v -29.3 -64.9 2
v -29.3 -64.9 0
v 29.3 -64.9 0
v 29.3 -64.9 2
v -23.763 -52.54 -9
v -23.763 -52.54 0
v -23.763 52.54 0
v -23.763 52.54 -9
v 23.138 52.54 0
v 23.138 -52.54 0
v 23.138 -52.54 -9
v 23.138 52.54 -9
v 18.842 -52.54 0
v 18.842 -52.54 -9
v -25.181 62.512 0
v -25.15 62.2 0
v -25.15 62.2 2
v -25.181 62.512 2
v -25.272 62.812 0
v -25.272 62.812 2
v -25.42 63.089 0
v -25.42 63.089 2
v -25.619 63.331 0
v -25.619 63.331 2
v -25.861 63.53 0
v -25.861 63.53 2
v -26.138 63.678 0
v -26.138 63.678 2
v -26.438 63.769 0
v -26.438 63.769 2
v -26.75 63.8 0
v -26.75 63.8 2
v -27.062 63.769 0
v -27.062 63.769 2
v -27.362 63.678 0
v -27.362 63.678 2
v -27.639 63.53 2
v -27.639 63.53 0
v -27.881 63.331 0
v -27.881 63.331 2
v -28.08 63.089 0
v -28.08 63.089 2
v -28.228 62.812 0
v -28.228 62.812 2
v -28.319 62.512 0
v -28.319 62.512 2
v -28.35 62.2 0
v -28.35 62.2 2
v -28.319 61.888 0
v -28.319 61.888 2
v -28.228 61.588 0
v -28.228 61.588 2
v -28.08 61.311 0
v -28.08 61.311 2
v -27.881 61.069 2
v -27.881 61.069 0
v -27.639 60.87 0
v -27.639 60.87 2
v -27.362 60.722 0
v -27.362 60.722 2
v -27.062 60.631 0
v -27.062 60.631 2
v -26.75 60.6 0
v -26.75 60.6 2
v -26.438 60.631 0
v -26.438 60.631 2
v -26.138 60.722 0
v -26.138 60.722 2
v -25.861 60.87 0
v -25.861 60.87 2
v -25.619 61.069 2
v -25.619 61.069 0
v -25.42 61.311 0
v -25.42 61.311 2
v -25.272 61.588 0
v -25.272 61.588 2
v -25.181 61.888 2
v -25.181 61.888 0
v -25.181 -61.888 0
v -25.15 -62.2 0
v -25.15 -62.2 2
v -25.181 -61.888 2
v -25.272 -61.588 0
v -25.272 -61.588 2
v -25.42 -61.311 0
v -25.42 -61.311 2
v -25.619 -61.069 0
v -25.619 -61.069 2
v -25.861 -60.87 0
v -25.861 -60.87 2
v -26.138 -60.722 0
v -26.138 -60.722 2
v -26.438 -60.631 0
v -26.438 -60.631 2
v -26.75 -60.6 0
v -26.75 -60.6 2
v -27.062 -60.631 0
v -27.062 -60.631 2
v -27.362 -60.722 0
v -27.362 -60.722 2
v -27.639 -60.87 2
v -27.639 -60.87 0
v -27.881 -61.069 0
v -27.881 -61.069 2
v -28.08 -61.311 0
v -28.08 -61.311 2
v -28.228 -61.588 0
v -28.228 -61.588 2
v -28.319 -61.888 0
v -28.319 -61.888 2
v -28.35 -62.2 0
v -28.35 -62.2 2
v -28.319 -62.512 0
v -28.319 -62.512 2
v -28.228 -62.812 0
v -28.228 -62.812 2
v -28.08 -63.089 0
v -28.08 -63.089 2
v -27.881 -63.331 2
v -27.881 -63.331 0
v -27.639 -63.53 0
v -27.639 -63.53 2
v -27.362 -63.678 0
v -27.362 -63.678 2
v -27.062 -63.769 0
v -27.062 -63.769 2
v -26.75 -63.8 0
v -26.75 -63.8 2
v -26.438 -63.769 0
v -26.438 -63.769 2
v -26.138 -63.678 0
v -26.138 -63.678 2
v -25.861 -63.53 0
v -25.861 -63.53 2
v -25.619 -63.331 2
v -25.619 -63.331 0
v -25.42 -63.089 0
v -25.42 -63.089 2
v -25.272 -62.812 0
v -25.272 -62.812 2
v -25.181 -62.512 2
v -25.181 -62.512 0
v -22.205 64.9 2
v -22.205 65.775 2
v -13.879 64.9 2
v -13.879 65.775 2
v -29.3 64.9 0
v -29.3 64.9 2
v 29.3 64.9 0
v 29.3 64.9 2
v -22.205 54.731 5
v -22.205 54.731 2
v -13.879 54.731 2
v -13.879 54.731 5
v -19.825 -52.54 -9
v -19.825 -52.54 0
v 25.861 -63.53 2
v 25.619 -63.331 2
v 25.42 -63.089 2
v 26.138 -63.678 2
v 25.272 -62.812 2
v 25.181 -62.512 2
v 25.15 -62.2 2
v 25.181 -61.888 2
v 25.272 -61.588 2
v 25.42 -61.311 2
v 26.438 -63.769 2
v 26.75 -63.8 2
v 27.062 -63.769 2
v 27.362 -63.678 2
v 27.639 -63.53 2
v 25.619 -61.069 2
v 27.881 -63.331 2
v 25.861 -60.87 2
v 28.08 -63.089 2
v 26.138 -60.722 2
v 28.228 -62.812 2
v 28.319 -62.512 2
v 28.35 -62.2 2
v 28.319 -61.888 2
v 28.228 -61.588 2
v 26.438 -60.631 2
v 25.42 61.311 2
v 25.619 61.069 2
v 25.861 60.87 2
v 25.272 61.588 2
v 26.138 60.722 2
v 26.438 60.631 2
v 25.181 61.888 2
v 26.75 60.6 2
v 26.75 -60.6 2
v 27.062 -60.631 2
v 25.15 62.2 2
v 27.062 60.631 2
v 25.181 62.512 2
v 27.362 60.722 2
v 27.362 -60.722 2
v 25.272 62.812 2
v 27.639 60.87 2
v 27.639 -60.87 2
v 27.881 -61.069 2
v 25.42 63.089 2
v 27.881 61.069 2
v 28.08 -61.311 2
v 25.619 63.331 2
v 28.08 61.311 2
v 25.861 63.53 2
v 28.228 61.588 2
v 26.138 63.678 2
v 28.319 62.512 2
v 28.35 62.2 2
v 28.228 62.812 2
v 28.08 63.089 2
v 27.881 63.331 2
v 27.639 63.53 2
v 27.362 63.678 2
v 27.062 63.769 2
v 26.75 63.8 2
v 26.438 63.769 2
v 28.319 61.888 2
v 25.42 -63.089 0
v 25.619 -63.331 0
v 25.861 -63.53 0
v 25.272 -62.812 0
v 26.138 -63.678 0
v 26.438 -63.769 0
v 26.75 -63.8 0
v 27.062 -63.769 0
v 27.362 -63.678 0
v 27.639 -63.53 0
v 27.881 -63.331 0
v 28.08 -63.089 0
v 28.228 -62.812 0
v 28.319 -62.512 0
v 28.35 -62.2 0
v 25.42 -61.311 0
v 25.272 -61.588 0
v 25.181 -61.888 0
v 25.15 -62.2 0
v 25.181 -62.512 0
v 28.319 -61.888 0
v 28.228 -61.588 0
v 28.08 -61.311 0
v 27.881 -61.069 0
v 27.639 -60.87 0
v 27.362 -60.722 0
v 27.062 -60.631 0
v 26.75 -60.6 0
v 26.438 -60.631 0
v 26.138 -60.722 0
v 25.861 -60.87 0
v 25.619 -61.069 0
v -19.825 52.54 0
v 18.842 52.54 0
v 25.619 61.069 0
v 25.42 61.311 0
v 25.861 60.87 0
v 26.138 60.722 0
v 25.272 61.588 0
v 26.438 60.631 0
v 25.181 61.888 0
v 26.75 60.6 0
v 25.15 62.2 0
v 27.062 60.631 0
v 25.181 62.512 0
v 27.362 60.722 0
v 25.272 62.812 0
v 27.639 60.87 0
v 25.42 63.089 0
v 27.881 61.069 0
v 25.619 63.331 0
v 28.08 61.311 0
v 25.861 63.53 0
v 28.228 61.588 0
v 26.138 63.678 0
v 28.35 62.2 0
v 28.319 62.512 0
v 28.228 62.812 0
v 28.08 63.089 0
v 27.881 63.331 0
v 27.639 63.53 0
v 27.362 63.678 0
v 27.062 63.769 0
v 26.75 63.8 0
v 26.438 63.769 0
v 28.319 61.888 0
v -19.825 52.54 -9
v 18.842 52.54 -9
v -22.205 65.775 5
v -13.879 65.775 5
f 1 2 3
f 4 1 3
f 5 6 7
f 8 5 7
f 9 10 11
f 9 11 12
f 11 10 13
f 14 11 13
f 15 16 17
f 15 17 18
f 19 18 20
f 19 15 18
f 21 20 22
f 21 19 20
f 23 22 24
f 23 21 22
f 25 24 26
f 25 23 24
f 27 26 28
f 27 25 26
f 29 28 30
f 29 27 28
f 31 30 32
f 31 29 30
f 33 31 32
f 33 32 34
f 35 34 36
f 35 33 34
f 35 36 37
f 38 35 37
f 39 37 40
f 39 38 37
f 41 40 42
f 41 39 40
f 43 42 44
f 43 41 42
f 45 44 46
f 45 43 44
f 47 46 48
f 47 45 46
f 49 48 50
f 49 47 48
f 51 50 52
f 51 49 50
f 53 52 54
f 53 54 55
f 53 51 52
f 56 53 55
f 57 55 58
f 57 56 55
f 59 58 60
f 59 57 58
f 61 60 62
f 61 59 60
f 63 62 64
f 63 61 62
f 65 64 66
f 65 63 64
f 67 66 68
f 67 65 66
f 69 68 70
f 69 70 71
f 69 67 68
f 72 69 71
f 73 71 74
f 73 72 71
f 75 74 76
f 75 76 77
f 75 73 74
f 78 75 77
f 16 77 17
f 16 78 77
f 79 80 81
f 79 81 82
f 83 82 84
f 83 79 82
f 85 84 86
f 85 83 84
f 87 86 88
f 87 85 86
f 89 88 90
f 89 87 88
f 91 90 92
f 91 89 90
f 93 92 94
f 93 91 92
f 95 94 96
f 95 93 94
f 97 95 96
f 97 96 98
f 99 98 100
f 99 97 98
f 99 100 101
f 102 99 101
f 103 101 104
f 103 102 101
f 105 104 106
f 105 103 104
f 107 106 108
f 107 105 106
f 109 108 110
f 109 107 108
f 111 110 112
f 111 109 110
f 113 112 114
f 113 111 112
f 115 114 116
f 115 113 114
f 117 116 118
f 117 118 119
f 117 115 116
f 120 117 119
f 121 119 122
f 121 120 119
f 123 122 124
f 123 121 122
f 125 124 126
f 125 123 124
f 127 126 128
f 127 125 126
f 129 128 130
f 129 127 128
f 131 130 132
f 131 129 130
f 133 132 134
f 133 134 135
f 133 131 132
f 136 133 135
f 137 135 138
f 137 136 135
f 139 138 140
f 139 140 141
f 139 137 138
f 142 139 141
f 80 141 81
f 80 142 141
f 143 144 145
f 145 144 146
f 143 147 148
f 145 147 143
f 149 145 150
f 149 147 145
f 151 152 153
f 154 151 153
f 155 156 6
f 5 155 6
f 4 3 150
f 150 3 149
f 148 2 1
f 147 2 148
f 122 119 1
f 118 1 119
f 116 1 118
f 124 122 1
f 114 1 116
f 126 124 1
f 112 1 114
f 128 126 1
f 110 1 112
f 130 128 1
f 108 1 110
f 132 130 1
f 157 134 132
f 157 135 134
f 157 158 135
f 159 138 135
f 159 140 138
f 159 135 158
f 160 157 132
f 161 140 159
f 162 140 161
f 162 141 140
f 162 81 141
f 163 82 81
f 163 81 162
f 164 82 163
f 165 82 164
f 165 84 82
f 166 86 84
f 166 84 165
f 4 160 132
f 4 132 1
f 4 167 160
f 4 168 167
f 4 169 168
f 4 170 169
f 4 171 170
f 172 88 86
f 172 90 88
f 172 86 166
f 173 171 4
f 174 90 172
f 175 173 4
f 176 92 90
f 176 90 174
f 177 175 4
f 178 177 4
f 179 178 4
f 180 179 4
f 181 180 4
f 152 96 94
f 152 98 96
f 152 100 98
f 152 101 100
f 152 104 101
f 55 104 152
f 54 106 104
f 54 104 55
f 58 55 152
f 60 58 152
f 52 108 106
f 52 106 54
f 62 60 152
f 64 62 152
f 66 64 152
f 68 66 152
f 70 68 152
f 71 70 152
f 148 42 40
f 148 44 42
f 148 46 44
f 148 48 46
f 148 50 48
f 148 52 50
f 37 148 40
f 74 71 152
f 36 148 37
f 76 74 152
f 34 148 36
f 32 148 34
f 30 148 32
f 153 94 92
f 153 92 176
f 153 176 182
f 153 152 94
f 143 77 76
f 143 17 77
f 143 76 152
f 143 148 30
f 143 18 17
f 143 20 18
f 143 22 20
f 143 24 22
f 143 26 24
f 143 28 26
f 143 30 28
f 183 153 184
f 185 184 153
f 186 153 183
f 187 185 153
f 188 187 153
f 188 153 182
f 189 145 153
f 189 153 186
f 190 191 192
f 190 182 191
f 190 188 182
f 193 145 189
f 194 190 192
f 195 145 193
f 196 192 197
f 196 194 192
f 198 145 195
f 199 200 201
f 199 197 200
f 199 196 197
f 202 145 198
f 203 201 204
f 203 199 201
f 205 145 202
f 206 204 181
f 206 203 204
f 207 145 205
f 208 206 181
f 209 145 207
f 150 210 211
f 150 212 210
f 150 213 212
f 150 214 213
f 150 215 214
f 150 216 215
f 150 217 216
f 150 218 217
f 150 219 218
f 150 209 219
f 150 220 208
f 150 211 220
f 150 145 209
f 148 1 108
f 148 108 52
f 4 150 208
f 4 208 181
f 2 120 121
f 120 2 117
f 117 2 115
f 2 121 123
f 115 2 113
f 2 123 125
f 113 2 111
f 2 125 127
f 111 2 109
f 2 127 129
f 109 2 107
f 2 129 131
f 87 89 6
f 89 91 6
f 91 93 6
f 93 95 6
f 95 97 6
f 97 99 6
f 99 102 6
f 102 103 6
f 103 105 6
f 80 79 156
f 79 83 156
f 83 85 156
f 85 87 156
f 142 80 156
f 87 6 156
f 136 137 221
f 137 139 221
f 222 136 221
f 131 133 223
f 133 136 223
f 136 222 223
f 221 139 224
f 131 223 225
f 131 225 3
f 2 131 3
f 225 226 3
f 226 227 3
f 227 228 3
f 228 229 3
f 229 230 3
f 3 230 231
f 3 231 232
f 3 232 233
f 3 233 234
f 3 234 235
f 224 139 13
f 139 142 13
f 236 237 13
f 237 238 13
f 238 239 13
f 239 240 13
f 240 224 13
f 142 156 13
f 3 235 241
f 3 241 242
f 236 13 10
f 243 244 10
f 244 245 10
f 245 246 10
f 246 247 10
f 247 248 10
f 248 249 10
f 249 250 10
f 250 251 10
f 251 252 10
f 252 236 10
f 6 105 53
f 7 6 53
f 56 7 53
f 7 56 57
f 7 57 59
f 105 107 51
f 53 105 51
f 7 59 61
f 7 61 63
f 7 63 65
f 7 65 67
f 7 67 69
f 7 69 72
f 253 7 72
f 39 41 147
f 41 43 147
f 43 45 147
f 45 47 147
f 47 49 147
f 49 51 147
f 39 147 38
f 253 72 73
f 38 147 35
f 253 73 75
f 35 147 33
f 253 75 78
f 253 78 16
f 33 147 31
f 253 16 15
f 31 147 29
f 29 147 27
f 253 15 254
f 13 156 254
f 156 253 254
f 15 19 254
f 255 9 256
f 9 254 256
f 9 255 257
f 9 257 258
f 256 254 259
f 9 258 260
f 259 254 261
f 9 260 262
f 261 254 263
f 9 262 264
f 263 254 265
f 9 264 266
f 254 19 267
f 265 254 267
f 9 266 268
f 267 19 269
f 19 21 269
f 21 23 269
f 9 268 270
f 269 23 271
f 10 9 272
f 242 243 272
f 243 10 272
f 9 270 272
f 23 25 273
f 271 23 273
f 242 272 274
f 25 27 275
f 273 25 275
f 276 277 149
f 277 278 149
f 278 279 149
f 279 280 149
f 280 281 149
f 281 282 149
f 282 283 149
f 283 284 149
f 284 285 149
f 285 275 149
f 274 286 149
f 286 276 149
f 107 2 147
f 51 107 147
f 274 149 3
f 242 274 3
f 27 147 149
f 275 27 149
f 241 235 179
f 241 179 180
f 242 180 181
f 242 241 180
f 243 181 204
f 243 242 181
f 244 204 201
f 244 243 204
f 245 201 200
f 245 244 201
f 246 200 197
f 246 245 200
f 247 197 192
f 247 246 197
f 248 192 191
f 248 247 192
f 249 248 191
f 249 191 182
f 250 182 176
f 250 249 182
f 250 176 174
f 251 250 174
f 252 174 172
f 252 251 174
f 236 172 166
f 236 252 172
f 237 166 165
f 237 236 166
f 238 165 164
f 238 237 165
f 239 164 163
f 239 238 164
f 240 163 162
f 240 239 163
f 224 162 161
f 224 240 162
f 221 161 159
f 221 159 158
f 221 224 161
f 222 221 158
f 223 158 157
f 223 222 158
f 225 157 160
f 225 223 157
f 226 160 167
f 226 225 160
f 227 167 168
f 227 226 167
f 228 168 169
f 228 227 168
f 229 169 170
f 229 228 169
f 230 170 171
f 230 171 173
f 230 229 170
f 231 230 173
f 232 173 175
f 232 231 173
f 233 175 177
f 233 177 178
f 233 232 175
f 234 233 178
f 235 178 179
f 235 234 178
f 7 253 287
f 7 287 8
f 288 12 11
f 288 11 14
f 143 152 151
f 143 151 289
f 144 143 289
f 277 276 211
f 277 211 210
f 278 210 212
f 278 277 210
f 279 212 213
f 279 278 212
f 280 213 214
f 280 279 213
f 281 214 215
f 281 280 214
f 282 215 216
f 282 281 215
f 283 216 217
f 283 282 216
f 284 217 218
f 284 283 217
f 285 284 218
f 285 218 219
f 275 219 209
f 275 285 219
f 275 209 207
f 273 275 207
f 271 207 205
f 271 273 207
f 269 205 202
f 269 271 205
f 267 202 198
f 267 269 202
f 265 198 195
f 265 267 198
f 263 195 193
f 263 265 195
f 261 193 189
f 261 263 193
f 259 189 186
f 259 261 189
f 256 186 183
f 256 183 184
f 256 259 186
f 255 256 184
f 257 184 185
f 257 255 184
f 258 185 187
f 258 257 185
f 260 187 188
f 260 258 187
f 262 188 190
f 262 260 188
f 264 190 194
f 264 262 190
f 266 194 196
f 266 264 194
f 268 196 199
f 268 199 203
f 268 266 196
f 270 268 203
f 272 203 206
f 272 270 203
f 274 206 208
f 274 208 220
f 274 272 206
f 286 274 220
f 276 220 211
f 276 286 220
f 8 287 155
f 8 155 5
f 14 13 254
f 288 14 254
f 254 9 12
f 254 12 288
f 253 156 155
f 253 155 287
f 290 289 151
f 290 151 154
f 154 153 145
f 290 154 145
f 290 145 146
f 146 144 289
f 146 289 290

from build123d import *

# Parameters (mm, degrees)
SKETCH1_W           = 58.6
SKETCH1_H           = 129.8
SKETCH1_R           = 1.6
BOSS_EXTRUDE1_DEPTH = 2
SKETCH2_W           = 4.296297389
SKETCH2_H           = 105.080273626
SKETCH2_W_2         = 3.938272606
BOSS_EXTRUDE2_DEPTH = 9
SKETCH3_W           = 8.325714973
SKETCH3_H           = 11.044315781
BOSS_EXTRUDE3_DEPTH = 3


with BuildPart() as part:
    # Sketch1 → Boss-Extrude1 (new body)
    with BuildSketch(Plane.XY):
        Rectangle(SKETCH1_W, SKETCH1_H)
        with Locations((-26.75, 62.2)):
            Circle(SKETCH1_R, mode=Mode.SUBTRACT)
        with Locations((26.75, 62.2)):
            Circle(SKETCH1_R, mode=Mode.SUBTRACT)
        with Locations((-26.75, -62.2)):
            Circle(SKETCH1_R, mode=Mode.SUBTRACT)
        with Locations((26.75, -62.2)):
            Circle(SKETCH1_R, mode=Mode.SUBTRACT)
    extrude(amount=BOSS_EXTRUDE1_DEPTH)

    # Sketch2 → Boss-Extrude2 (add)
    with BuildSketch(Plane(origin=(0, 0, 0), x_dir=(-1, 0, 0), z_dir=(0, 0, -1))):
        with Locations((-20.989773544, 0)):
            Rectangle(SKETCH2_W, SKETCH2_H)
        with Locations((21.79418795, 0)):
            Rectangle(SKETCH2_W_2, SKETCH2_H)
    extrude(amount=BOSS_EXTRUDE2_DEPTH)

    # Sketch3 → Boss-Extrude3 (add)
    with BuildSketch(Plane.XY.offset(2)):
        with Locations((-18.042212682, 60.253196822)):
            Rectangle(SKETCH3_W, SKETCH3_H)
    extrude(amount=BOSS_EXTRUDE3_DEPTH)


solid = part.part
